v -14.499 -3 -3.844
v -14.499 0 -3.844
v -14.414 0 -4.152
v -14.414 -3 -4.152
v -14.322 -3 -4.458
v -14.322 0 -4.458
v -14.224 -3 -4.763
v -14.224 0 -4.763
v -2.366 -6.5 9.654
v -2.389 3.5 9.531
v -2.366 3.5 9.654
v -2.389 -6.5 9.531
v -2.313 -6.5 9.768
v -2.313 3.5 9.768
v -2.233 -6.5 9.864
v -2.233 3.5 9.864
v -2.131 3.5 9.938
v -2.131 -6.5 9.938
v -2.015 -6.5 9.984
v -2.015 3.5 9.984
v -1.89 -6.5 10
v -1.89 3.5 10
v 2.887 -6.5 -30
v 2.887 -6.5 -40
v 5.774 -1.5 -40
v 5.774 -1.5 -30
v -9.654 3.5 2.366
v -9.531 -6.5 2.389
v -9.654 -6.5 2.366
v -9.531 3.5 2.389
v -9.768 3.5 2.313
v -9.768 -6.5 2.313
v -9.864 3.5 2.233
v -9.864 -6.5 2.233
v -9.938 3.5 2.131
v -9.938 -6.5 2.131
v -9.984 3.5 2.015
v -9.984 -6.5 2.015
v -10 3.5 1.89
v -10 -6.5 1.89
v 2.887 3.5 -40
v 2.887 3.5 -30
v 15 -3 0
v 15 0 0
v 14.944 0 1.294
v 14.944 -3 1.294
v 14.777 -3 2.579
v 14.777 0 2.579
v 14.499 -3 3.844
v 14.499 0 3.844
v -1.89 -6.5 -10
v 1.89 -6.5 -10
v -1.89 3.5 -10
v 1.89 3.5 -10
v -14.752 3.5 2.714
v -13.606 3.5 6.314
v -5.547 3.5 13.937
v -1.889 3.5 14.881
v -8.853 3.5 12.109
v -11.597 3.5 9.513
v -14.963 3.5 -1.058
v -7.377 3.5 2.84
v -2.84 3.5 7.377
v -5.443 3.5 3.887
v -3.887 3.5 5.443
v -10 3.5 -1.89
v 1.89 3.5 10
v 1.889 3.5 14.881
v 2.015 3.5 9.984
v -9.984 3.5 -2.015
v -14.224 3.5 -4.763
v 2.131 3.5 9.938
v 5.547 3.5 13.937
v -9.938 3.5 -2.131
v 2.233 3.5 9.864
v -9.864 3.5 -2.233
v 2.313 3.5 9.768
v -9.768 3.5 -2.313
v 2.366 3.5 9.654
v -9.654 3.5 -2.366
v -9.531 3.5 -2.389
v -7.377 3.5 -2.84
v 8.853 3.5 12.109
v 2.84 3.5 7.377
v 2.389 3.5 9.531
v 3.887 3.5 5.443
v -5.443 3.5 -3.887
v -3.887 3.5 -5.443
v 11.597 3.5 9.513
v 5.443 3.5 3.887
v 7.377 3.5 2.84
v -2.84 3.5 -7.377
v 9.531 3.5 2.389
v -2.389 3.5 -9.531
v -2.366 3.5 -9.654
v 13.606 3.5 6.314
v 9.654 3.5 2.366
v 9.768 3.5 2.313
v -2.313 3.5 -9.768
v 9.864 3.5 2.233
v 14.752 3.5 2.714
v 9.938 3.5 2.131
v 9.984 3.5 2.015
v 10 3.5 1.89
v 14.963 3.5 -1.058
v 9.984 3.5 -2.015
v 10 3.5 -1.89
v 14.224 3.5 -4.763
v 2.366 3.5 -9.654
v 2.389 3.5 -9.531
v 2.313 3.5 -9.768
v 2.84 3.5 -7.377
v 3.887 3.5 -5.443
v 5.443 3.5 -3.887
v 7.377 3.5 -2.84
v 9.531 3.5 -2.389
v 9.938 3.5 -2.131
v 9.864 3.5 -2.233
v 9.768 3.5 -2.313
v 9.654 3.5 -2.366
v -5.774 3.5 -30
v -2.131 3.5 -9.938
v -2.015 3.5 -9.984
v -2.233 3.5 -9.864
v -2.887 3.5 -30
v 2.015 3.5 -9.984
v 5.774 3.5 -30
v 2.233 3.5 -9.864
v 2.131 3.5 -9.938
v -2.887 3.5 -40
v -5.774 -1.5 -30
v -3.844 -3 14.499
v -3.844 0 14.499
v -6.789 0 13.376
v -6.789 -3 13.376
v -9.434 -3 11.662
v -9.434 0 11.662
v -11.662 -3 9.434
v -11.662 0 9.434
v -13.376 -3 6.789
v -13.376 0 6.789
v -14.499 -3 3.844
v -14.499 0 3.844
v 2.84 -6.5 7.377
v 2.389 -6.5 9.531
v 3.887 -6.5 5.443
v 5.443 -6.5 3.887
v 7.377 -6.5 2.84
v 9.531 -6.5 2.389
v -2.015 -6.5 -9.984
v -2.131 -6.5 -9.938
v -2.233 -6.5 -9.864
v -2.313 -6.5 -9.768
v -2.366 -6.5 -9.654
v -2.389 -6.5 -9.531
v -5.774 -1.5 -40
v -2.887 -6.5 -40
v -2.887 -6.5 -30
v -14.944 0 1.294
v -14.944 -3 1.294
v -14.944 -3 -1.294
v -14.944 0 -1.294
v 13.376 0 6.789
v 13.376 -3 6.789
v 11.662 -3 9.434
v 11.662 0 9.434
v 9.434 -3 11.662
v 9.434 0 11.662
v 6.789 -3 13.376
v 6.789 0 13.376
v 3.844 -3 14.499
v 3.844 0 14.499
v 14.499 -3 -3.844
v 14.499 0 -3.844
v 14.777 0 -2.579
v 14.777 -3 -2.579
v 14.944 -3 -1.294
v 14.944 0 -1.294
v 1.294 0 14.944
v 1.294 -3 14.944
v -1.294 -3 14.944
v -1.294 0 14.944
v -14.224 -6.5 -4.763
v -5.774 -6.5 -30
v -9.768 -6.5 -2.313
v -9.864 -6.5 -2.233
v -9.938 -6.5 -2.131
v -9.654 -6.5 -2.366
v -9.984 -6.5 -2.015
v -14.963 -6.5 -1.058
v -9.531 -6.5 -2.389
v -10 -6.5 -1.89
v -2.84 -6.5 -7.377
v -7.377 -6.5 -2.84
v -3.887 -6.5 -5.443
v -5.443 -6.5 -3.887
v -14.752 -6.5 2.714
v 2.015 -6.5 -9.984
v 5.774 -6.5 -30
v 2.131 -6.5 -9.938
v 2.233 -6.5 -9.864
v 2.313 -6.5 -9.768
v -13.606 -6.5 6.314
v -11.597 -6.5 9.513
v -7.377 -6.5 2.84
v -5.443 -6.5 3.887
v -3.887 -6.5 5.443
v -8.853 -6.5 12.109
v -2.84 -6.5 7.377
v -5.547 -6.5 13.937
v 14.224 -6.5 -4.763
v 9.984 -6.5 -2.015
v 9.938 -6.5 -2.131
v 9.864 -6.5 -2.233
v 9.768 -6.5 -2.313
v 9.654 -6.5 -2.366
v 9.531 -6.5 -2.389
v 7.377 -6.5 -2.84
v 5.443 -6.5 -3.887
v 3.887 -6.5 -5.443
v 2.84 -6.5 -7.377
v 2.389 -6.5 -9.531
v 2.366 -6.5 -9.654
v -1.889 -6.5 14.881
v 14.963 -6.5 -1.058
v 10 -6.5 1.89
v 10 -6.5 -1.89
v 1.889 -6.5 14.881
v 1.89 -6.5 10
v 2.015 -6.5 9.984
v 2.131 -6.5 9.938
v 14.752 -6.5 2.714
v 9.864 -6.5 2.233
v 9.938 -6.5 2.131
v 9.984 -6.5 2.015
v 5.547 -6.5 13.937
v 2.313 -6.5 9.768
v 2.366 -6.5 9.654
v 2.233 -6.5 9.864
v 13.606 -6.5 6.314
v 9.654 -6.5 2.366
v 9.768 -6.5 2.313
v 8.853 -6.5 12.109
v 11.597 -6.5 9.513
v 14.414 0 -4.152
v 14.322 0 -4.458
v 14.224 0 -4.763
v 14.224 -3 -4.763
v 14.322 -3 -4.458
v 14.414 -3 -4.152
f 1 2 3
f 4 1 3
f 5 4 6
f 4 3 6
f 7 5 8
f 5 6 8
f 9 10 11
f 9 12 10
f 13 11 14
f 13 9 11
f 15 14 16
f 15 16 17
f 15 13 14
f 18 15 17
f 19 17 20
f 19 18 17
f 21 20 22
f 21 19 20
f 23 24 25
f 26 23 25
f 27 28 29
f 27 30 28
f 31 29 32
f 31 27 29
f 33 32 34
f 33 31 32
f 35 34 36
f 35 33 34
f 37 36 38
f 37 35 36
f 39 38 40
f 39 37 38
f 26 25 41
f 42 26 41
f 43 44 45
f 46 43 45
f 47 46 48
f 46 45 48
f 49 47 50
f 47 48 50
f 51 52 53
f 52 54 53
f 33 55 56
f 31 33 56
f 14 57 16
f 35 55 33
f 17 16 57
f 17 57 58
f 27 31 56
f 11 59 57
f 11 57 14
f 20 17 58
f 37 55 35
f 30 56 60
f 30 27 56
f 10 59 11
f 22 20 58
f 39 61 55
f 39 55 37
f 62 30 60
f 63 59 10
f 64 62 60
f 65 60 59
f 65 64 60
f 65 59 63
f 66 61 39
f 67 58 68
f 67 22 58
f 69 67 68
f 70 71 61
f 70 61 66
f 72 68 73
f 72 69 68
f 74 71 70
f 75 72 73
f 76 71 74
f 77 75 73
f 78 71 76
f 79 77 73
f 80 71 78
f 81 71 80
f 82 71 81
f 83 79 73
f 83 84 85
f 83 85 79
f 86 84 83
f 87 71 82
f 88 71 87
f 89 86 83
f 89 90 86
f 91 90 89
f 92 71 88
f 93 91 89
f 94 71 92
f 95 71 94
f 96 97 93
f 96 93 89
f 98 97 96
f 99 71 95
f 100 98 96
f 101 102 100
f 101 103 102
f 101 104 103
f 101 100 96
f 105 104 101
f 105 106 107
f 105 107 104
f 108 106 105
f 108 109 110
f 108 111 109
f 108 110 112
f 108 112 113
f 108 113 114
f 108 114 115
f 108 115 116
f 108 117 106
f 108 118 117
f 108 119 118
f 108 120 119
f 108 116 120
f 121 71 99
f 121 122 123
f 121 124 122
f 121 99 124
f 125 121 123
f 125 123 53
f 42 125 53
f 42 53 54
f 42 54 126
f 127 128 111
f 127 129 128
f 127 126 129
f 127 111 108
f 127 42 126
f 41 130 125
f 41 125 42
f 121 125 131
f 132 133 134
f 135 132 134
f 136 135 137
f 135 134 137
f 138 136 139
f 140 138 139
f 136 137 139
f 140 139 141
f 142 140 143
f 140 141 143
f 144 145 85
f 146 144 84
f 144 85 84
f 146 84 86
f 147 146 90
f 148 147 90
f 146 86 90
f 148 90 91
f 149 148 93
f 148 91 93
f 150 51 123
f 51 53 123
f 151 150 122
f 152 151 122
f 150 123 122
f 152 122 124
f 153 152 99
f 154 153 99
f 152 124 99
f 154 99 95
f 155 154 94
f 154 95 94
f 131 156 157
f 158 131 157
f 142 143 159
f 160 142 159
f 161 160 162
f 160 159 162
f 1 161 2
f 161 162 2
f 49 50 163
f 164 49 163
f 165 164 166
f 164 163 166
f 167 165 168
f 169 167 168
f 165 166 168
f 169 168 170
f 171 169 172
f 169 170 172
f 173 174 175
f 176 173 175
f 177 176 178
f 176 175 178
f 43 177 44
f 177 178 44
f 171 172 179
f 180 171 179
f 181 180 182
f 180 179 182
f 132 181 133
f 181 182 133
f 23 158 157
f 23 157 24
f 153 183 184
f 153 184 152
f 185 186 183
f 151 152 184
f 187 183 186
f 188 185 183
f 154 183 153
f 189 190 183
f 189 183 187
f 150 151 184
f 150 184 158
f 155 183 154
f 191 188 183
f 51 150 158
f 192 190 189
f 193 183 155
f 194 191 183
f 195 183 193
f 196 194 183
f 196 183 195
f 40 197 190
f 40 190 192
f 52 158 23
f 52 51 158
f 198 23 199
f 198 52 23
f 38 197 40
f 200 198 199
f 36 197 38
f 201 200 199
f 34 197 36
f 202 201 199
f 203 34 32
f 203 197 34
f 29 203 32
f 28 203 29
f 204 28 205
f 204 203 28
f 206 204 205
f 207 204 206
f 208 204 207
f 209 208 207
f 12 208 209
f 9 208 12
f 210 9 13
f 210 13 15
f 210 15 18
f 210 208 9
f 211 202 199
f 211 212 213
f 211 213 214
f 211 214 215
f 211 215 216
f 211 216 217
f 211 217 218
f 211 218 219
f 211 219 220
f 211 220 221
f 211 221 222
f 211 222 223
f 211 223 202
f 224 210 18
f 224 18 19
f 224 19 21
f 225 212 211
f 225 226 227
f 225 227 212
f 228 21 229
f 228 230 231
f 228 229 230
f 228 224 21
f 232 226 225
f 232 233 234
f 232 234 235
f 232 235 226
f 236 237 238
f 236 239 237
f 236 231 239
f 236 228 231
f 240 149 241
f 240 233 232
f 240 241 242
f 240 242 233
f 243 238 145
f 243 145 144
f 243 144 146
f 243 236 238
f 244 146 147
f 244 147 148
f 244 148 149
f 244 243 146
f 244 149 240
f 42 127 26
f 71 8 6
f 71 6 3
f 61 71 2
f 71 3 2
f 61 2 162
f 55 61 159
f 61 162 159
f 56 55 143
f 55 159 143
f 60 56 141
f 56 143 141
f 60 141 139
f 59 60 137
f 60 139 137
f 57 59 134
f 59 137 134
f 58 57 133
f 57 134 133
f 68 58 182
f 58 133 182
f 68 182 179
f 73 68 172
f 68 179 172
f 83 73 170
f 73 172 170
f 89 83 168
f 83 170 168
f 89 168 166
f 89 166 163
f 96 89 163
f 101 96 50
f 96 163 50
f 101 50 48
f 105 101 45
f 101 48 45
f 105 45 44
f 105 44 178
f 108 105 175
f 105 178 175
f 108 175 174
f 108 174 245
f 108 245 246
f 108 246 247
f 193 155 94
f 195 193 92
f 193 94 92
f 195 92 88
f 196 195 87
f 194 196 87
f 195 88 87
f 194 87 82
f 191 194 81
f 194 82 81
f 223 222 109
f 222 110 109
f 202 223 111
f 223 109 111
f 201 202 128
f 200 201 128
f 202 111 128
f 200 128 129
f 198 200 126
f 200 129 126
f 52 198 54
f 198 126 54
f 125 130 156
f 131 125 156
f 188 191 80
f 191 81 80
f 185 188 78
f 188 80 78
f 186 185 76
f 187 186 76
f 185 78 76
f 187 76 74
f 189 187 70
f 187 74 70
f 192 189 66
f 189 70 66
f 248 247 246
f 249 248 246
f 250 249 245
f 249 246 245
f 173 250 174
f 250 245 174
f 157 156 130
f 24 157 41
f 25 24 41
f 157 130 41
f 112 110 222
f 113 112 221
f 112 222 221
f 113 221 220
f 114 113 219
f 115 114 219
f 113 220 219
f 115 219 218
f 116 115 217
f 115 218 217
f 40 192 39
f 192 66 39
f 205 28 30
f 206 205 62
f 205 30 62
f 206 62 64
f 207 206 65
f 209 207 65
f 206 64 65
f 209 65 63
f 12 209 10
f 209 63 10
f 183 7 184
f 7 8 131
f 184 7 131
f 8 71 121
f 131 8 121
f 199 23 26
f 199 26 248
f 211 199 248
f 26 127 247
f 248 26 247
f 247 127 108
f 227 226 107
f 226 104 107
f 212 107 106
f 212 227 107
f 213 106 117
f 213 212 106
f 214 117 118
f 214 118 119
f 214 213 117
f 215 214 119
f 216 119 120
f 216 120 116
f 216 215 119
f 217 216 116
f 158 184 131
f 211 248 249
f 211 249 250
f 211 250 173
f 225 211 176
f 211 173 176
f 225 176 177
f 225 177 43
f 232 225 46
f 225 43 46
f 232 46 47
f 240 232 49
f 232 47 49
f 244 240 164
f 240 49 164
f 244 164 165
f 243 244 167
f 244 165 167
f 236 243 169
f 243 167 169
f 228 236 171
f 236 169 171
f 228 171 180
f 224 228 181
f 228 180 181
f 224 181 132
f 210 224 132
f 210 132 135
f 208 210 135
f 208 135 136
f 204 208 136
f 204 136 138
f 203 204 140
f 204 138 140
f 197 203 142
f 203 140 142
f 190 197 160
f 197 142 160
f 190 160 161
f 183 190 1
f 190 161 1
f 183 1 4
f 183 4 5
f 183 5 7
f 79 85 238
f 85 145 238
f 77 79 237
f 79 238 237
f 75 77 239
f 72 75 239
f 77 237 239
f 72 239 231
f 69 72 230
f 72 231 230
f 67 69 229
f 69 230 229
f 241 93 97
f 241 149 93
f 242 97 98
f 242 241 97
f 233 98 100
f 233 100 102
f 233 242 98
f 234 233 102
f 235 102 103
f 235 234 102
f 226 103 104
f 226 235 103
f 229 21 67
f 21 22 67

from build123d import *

# Parameters (mm, degrees)
F1_DEPTH   = 3
F5_DEPTH   = 10
F7_DEPTH   = 3
F1_FACE1_R = 15
F8_DEPTH   = 3.5
F1_FACE_R  = 15
F9_DEPTH   = 3.5
F11_R      = 0.5


with BuildPart() as f1:
    # F0 (on Front) → F1 (new body)
    with BuildSketch(Plane.XZ):
        with BuildLine():
            Line((-10, -2.375), (-10, 2.375))
            ThreePointArc((-10, 2.375), (-12.3664158462, 2.7515035323), (-14.4991362367, 3.8438325133))
            ThreePointArc((-14.4991362367, 3.8438325133), (-15, 0), (-14.4991362367, -3.8438325133))
            ThreePointArc((-14.4991362367, -3.8438325133), (-12.3664158462, -2.7515035323), (-10, -2.375))
        make_face()
        with BuildLine():
            Line((-10, 10), (-2.375, 10))
            ThreePointArc((-2.375, 10), (-2.7515035323, 12.3664158462), (-3.8438325133, 14.4991362367))
            ThreePointArc((-3.8438325133, 14.4991362367), (-10.6066017178, 10.6066017178), (-14.4991362367, 3.8438325133))
            ThreePointArc((-14.4991362367, 3.8438325133), (-12.3664158462, 2.7515035323), (-10, 2.375))
            Line((-10, 2.375), (-10, 10))
        make_face()
        with BuildLine():
            ThreePointArc((-10, 2.375), (-4.6083107935, 4.6083107935), (-2.375, 10))
            Line((-2.375, 10), (-10, 10))
            Line((-10, 10), (-10, 2.375))
        make_face()
        with BuildLine():
            Line((-2.375, 10), (2.375, 10))
            ThreePointArc((2.375, 10), (2.7515035323, 12.3664158462), (3.8438325133, 14.4991362367))
            ThreePointArc((3.8438325133, 14.4991362367), (0, 15), (-3.8438325133, 14.4991362367))
            ThreePointArc((-3.8438325133, 14.4991362367), (-2.7515035323, 12.3664158462), (-2.375, 10))
        make_face()
        with BuildLine():
            Line((2.375, 10), (10, 10))
            Line((10, 10), (10, 2.375))
            ThreePointArc((10, 2.375), (12.3664158462, 2.7515035323), (14.4991362367, 3.8438325133))
            ThreePointArc((14.4991362367, 3.8438325133), (10.6066017178, 10.6066017178), (3.8438325133, 14.4991362367))
            ThreePointArc((3.8438325133, 14.4991362367), (2.7515035323, 12.3664158462), (2.375, 10))
        make_face()
        with BuildLine():
            ThreePointArc((14.4991362367, 3.8438325133), (12.3664158462, 2.7515035323), (10, 2.375))
            Line((10, 2.375), (10, -2.375))
            ThreePointArc((10, -2.375), (12.3664158462, -2.7515035323), (14.4991362367, -3.8438325133))
            ThreePointArc((14.4991362367, -3.8438325133), (14.8742570159, -1.9381636218), (15, 0))
            ThreePointArc((15, 0), (14.8742570159, 1.9381636218), (14.4991362367, 3.8438325133))
        make_face()
        with BuildLine():
            ThreePointArc((14.4991362367, -3.8438325133), (12.3664158462, -2.7515035323), (10, -2.375))
            Line((10, -2.375), (10, -10))
            Line((10, -10), (2.375, -10))
            ThreePointArc((2.375, -10), (2.7515035323, -12.3664158462), (3.8438325133, -14.4991362367))
            ThreePointArc((3.8438325133, -14.4991362367), (10.6066017178, -10.6066017178), (14.4991362367, -3.8438325133))
        make_face()
        with BuildLine():
            ThreePointArc((3.8438325133, -14.4991362367), (2.7515035323, -12.3664158462), (2.375, -10))
            Line((2.375, -10), (-2.375, -10))
            ThreePointArc((-2.375, -10), (-2.7515035323, -12.3664158462), (-3.8438325133, -14.4991362367))
            ThreePointArc((-3.8438325133, -14.4991362367), (0, -15), (3.8438325133, -14.4991362367))
        make_face()
        with BuildLine():
            Line((-10, -10), (-10, -2.375))
            ThreePointArc((-10, -2.375), (-12.3664158462, -2.7515035323), (-14.4991362367, -3.8438325133))
            ThreePointArc((-14.4991362367, -3.8438325133), (-10.6066017178, -10.6066017178), (-3.8438325133, -14.4991362367))
            ThreePointArc((-3.8438325133, -14.4991362367), (-2.7515035323, -12.3664158462), (-2.375, -10))
            Line((-2.375, -10), (-10, -10))
        make_face()
        with BuildLine():
            ThreePointArc((-2.375, -10), (-4.6083107935, -4.6083107935), (-10, -2.375))
            Line((-10, -2.375), (-10, -10))
            Line((-10, -10), (-2.375, -10))
        make_face()
        with BuildLine():
            Line((10, -10), (10, -2.375))
            ThreePointArc((10, -2.375), (4.6083107935, -4.6083107935), (2.375, -10))
            Line((2.375, -10), (10, -10))
        make_face()
        with BuildLine():
            Line((10, 2.375), (10, 10))
            Line((10, 10), (2.375, 10))
            ThreePointArc((2.375, 10), (4.6083107935, 4.6083107935), (10, 2.375))
        make_face()
    extrude(amount=F1_DEPTH)


with BuildPart() as f5:
    # F4 (on offset) → F5 (new body)
    with BuildSketch(Plane.XY.offset(-40)):
        Polygon((2.8867513459, 3.5), (-2.8867513459, 3.5), (-5.7735026919, -1.5), (-2.8867513459, -6.5), (2.8867513459, -6.5), (5.7735026919, -1.5), align=None)
    extrude(amount=F5_DEPTH)


with BuildPart() as f7:
    # F6 (on face) → F7 (new body, through all)
    with BuildSketch(Plane(origin=(0, 0, 0), x_dir=(-1, 0, 0), z_dir=(0, 1, 0))):
        with BuildLine():
            ThreePointArc((14.2238332207, -4.7626220204), (0, -15), (-14.2238332207, -4.7626220204))
            Line((-14.2238332207, -4.7626220204), (-5.7735026919, -30))
            Line((-5.7735026919, -30), (5.7735026919, -30))
            Line((5.7735026919, -30), (14.2238332207, -4.7626220204))
        make_face()
    extrude(amount=-F7_DEPTH)


with BuildPart() as f8:
    # F7_face (on face) + F1_face1 (on face) → F8 (new body, through all)
    with BuildSketch(Plane(origin=(0, 0, -20.4204827201), x_dir=(-1, 0, 0), z_dir=(0, 1, 0))):
        with BuildLine():
            ThreePointArc((14.2238332207, 15.6578606997), (0, 5.4204827201), (-14.2238332207, 15.6578606997))
            Line((-14.2238332207, 15.6578606997), (-5.7735026919, -9.5795172799))
            Line((-5.7735026919, -9.5795172799), (5.7735026919, -9.5795172799))
            Line((5.7735026919, -9.5795172799), (14.2238332207, 15.6578606997))
        make_face()
    with BuildSketch(Plane(origin=(0, 0, 0), x_dir=(1, 0, 0), z_dir=(0, 1, 0))):
        Circle(F1_FACE1_R)
        with BuildLine():
            ThreePointArc((-2.375, -10), (-4.6083107935, -4.6083107935), (-10, -2.375))
            Line((-10, -2.375), (-10, 2.375))
            ThreePointArc((-10, 2.375), (-4.6083107935, 4.6083107935), (-2.375, 10))
            Line((-2.375, 10), (2.375, 10))
            ThreePointArc((2.375, 10), (4.6083107935, 4.6083107935), (10, 2.375))
            Line((10, 2.375), (10, -2.375))
            ThreePointArc((10, -2.375), (4.6083107935, -4.6083107935), (2.375, -10))
            Line((2.375, -10), (-2.375, -10))
        make_face(mode=Mode.SUBTRACT)
    extrude(amount=F8_DEPTH)


with BuildPart() as f9:
    # F1_face (on face) + F7_face1 (on face) → F9 (new body, through all)
    with BuildSketch(Plane.XZ.offset(3)):
        Circle(F1_FACE_R)
        with BuildLine():
            ThreePointArc((-10, 2.375), (-4.6083107935, 4.6083107935), (-2.375, 10))
            Line((-2.375, 10), (2.375, 10))
            ThreePointArc((2.375, 10), (4.6083107935, 4.6083107935), (10, 2.375))
            Line((10, 2.375), (10, -2.375))
            ThreePointArc((10, -2.375), (4.6083107935, -4.6083107935), (2.375, -10))
            Line((2.375, -10), (-2.375, -10))
            ThreePointArc((-2.375, -10), (-4.6083107935, -4.6083107935), (-10, -2.375))
            Line((-10, -2.375), (-10, 2.375))
        make_face(mode=Mode.SUBTRACT)
    with BuildSketch(Plane(origin=(0, -3, -20.4204827201), x_dir=(-1, 0, 0), z_dir=(0, -1, 0))):
        with BuildLine():
            ThreePointArc((-14.2238332207, -15.6578606997), (0, -5.4204827201), (14.2238332207, -15.6578606997))
            Line((14.2238332207, -15.6578606997), (5.7735026919, 9.5795172799))
            Line((5.7735026919, 9.5795172799), (-5.7735026919, 9.5795172799))
            Line((-5.7735026919, 9.5795172799), (-14.2238332207, -15.6578606997))
        make_face()
    extrude(amount=F9_DEPTH)


with BuildPart() as f5_1:
    add(f5.part)

    # F10: union F8, F7, F9, F1
    add(f8.part)
    add(f7.part)
    add(f9.part)
    add(f1.part)

    # F11
    f11_edges = [f5_1.edges().sort_by_distance(p)[0] for p in [
        (10, -1.5, -2.375),
        (10, -1.5, 2.375),
        (2.375, -1.5, -10),
        (-2.375, -1.5, -10),
        (-10, -1.5, -2.375),
        (-10, -1.5, 2.375),
        (-2.375, -1.5, 10),
        (2.375, -1.5, 10),
    ]]
    fillet(f11_edges, radius=F11_R)


solid = f5_1.part
